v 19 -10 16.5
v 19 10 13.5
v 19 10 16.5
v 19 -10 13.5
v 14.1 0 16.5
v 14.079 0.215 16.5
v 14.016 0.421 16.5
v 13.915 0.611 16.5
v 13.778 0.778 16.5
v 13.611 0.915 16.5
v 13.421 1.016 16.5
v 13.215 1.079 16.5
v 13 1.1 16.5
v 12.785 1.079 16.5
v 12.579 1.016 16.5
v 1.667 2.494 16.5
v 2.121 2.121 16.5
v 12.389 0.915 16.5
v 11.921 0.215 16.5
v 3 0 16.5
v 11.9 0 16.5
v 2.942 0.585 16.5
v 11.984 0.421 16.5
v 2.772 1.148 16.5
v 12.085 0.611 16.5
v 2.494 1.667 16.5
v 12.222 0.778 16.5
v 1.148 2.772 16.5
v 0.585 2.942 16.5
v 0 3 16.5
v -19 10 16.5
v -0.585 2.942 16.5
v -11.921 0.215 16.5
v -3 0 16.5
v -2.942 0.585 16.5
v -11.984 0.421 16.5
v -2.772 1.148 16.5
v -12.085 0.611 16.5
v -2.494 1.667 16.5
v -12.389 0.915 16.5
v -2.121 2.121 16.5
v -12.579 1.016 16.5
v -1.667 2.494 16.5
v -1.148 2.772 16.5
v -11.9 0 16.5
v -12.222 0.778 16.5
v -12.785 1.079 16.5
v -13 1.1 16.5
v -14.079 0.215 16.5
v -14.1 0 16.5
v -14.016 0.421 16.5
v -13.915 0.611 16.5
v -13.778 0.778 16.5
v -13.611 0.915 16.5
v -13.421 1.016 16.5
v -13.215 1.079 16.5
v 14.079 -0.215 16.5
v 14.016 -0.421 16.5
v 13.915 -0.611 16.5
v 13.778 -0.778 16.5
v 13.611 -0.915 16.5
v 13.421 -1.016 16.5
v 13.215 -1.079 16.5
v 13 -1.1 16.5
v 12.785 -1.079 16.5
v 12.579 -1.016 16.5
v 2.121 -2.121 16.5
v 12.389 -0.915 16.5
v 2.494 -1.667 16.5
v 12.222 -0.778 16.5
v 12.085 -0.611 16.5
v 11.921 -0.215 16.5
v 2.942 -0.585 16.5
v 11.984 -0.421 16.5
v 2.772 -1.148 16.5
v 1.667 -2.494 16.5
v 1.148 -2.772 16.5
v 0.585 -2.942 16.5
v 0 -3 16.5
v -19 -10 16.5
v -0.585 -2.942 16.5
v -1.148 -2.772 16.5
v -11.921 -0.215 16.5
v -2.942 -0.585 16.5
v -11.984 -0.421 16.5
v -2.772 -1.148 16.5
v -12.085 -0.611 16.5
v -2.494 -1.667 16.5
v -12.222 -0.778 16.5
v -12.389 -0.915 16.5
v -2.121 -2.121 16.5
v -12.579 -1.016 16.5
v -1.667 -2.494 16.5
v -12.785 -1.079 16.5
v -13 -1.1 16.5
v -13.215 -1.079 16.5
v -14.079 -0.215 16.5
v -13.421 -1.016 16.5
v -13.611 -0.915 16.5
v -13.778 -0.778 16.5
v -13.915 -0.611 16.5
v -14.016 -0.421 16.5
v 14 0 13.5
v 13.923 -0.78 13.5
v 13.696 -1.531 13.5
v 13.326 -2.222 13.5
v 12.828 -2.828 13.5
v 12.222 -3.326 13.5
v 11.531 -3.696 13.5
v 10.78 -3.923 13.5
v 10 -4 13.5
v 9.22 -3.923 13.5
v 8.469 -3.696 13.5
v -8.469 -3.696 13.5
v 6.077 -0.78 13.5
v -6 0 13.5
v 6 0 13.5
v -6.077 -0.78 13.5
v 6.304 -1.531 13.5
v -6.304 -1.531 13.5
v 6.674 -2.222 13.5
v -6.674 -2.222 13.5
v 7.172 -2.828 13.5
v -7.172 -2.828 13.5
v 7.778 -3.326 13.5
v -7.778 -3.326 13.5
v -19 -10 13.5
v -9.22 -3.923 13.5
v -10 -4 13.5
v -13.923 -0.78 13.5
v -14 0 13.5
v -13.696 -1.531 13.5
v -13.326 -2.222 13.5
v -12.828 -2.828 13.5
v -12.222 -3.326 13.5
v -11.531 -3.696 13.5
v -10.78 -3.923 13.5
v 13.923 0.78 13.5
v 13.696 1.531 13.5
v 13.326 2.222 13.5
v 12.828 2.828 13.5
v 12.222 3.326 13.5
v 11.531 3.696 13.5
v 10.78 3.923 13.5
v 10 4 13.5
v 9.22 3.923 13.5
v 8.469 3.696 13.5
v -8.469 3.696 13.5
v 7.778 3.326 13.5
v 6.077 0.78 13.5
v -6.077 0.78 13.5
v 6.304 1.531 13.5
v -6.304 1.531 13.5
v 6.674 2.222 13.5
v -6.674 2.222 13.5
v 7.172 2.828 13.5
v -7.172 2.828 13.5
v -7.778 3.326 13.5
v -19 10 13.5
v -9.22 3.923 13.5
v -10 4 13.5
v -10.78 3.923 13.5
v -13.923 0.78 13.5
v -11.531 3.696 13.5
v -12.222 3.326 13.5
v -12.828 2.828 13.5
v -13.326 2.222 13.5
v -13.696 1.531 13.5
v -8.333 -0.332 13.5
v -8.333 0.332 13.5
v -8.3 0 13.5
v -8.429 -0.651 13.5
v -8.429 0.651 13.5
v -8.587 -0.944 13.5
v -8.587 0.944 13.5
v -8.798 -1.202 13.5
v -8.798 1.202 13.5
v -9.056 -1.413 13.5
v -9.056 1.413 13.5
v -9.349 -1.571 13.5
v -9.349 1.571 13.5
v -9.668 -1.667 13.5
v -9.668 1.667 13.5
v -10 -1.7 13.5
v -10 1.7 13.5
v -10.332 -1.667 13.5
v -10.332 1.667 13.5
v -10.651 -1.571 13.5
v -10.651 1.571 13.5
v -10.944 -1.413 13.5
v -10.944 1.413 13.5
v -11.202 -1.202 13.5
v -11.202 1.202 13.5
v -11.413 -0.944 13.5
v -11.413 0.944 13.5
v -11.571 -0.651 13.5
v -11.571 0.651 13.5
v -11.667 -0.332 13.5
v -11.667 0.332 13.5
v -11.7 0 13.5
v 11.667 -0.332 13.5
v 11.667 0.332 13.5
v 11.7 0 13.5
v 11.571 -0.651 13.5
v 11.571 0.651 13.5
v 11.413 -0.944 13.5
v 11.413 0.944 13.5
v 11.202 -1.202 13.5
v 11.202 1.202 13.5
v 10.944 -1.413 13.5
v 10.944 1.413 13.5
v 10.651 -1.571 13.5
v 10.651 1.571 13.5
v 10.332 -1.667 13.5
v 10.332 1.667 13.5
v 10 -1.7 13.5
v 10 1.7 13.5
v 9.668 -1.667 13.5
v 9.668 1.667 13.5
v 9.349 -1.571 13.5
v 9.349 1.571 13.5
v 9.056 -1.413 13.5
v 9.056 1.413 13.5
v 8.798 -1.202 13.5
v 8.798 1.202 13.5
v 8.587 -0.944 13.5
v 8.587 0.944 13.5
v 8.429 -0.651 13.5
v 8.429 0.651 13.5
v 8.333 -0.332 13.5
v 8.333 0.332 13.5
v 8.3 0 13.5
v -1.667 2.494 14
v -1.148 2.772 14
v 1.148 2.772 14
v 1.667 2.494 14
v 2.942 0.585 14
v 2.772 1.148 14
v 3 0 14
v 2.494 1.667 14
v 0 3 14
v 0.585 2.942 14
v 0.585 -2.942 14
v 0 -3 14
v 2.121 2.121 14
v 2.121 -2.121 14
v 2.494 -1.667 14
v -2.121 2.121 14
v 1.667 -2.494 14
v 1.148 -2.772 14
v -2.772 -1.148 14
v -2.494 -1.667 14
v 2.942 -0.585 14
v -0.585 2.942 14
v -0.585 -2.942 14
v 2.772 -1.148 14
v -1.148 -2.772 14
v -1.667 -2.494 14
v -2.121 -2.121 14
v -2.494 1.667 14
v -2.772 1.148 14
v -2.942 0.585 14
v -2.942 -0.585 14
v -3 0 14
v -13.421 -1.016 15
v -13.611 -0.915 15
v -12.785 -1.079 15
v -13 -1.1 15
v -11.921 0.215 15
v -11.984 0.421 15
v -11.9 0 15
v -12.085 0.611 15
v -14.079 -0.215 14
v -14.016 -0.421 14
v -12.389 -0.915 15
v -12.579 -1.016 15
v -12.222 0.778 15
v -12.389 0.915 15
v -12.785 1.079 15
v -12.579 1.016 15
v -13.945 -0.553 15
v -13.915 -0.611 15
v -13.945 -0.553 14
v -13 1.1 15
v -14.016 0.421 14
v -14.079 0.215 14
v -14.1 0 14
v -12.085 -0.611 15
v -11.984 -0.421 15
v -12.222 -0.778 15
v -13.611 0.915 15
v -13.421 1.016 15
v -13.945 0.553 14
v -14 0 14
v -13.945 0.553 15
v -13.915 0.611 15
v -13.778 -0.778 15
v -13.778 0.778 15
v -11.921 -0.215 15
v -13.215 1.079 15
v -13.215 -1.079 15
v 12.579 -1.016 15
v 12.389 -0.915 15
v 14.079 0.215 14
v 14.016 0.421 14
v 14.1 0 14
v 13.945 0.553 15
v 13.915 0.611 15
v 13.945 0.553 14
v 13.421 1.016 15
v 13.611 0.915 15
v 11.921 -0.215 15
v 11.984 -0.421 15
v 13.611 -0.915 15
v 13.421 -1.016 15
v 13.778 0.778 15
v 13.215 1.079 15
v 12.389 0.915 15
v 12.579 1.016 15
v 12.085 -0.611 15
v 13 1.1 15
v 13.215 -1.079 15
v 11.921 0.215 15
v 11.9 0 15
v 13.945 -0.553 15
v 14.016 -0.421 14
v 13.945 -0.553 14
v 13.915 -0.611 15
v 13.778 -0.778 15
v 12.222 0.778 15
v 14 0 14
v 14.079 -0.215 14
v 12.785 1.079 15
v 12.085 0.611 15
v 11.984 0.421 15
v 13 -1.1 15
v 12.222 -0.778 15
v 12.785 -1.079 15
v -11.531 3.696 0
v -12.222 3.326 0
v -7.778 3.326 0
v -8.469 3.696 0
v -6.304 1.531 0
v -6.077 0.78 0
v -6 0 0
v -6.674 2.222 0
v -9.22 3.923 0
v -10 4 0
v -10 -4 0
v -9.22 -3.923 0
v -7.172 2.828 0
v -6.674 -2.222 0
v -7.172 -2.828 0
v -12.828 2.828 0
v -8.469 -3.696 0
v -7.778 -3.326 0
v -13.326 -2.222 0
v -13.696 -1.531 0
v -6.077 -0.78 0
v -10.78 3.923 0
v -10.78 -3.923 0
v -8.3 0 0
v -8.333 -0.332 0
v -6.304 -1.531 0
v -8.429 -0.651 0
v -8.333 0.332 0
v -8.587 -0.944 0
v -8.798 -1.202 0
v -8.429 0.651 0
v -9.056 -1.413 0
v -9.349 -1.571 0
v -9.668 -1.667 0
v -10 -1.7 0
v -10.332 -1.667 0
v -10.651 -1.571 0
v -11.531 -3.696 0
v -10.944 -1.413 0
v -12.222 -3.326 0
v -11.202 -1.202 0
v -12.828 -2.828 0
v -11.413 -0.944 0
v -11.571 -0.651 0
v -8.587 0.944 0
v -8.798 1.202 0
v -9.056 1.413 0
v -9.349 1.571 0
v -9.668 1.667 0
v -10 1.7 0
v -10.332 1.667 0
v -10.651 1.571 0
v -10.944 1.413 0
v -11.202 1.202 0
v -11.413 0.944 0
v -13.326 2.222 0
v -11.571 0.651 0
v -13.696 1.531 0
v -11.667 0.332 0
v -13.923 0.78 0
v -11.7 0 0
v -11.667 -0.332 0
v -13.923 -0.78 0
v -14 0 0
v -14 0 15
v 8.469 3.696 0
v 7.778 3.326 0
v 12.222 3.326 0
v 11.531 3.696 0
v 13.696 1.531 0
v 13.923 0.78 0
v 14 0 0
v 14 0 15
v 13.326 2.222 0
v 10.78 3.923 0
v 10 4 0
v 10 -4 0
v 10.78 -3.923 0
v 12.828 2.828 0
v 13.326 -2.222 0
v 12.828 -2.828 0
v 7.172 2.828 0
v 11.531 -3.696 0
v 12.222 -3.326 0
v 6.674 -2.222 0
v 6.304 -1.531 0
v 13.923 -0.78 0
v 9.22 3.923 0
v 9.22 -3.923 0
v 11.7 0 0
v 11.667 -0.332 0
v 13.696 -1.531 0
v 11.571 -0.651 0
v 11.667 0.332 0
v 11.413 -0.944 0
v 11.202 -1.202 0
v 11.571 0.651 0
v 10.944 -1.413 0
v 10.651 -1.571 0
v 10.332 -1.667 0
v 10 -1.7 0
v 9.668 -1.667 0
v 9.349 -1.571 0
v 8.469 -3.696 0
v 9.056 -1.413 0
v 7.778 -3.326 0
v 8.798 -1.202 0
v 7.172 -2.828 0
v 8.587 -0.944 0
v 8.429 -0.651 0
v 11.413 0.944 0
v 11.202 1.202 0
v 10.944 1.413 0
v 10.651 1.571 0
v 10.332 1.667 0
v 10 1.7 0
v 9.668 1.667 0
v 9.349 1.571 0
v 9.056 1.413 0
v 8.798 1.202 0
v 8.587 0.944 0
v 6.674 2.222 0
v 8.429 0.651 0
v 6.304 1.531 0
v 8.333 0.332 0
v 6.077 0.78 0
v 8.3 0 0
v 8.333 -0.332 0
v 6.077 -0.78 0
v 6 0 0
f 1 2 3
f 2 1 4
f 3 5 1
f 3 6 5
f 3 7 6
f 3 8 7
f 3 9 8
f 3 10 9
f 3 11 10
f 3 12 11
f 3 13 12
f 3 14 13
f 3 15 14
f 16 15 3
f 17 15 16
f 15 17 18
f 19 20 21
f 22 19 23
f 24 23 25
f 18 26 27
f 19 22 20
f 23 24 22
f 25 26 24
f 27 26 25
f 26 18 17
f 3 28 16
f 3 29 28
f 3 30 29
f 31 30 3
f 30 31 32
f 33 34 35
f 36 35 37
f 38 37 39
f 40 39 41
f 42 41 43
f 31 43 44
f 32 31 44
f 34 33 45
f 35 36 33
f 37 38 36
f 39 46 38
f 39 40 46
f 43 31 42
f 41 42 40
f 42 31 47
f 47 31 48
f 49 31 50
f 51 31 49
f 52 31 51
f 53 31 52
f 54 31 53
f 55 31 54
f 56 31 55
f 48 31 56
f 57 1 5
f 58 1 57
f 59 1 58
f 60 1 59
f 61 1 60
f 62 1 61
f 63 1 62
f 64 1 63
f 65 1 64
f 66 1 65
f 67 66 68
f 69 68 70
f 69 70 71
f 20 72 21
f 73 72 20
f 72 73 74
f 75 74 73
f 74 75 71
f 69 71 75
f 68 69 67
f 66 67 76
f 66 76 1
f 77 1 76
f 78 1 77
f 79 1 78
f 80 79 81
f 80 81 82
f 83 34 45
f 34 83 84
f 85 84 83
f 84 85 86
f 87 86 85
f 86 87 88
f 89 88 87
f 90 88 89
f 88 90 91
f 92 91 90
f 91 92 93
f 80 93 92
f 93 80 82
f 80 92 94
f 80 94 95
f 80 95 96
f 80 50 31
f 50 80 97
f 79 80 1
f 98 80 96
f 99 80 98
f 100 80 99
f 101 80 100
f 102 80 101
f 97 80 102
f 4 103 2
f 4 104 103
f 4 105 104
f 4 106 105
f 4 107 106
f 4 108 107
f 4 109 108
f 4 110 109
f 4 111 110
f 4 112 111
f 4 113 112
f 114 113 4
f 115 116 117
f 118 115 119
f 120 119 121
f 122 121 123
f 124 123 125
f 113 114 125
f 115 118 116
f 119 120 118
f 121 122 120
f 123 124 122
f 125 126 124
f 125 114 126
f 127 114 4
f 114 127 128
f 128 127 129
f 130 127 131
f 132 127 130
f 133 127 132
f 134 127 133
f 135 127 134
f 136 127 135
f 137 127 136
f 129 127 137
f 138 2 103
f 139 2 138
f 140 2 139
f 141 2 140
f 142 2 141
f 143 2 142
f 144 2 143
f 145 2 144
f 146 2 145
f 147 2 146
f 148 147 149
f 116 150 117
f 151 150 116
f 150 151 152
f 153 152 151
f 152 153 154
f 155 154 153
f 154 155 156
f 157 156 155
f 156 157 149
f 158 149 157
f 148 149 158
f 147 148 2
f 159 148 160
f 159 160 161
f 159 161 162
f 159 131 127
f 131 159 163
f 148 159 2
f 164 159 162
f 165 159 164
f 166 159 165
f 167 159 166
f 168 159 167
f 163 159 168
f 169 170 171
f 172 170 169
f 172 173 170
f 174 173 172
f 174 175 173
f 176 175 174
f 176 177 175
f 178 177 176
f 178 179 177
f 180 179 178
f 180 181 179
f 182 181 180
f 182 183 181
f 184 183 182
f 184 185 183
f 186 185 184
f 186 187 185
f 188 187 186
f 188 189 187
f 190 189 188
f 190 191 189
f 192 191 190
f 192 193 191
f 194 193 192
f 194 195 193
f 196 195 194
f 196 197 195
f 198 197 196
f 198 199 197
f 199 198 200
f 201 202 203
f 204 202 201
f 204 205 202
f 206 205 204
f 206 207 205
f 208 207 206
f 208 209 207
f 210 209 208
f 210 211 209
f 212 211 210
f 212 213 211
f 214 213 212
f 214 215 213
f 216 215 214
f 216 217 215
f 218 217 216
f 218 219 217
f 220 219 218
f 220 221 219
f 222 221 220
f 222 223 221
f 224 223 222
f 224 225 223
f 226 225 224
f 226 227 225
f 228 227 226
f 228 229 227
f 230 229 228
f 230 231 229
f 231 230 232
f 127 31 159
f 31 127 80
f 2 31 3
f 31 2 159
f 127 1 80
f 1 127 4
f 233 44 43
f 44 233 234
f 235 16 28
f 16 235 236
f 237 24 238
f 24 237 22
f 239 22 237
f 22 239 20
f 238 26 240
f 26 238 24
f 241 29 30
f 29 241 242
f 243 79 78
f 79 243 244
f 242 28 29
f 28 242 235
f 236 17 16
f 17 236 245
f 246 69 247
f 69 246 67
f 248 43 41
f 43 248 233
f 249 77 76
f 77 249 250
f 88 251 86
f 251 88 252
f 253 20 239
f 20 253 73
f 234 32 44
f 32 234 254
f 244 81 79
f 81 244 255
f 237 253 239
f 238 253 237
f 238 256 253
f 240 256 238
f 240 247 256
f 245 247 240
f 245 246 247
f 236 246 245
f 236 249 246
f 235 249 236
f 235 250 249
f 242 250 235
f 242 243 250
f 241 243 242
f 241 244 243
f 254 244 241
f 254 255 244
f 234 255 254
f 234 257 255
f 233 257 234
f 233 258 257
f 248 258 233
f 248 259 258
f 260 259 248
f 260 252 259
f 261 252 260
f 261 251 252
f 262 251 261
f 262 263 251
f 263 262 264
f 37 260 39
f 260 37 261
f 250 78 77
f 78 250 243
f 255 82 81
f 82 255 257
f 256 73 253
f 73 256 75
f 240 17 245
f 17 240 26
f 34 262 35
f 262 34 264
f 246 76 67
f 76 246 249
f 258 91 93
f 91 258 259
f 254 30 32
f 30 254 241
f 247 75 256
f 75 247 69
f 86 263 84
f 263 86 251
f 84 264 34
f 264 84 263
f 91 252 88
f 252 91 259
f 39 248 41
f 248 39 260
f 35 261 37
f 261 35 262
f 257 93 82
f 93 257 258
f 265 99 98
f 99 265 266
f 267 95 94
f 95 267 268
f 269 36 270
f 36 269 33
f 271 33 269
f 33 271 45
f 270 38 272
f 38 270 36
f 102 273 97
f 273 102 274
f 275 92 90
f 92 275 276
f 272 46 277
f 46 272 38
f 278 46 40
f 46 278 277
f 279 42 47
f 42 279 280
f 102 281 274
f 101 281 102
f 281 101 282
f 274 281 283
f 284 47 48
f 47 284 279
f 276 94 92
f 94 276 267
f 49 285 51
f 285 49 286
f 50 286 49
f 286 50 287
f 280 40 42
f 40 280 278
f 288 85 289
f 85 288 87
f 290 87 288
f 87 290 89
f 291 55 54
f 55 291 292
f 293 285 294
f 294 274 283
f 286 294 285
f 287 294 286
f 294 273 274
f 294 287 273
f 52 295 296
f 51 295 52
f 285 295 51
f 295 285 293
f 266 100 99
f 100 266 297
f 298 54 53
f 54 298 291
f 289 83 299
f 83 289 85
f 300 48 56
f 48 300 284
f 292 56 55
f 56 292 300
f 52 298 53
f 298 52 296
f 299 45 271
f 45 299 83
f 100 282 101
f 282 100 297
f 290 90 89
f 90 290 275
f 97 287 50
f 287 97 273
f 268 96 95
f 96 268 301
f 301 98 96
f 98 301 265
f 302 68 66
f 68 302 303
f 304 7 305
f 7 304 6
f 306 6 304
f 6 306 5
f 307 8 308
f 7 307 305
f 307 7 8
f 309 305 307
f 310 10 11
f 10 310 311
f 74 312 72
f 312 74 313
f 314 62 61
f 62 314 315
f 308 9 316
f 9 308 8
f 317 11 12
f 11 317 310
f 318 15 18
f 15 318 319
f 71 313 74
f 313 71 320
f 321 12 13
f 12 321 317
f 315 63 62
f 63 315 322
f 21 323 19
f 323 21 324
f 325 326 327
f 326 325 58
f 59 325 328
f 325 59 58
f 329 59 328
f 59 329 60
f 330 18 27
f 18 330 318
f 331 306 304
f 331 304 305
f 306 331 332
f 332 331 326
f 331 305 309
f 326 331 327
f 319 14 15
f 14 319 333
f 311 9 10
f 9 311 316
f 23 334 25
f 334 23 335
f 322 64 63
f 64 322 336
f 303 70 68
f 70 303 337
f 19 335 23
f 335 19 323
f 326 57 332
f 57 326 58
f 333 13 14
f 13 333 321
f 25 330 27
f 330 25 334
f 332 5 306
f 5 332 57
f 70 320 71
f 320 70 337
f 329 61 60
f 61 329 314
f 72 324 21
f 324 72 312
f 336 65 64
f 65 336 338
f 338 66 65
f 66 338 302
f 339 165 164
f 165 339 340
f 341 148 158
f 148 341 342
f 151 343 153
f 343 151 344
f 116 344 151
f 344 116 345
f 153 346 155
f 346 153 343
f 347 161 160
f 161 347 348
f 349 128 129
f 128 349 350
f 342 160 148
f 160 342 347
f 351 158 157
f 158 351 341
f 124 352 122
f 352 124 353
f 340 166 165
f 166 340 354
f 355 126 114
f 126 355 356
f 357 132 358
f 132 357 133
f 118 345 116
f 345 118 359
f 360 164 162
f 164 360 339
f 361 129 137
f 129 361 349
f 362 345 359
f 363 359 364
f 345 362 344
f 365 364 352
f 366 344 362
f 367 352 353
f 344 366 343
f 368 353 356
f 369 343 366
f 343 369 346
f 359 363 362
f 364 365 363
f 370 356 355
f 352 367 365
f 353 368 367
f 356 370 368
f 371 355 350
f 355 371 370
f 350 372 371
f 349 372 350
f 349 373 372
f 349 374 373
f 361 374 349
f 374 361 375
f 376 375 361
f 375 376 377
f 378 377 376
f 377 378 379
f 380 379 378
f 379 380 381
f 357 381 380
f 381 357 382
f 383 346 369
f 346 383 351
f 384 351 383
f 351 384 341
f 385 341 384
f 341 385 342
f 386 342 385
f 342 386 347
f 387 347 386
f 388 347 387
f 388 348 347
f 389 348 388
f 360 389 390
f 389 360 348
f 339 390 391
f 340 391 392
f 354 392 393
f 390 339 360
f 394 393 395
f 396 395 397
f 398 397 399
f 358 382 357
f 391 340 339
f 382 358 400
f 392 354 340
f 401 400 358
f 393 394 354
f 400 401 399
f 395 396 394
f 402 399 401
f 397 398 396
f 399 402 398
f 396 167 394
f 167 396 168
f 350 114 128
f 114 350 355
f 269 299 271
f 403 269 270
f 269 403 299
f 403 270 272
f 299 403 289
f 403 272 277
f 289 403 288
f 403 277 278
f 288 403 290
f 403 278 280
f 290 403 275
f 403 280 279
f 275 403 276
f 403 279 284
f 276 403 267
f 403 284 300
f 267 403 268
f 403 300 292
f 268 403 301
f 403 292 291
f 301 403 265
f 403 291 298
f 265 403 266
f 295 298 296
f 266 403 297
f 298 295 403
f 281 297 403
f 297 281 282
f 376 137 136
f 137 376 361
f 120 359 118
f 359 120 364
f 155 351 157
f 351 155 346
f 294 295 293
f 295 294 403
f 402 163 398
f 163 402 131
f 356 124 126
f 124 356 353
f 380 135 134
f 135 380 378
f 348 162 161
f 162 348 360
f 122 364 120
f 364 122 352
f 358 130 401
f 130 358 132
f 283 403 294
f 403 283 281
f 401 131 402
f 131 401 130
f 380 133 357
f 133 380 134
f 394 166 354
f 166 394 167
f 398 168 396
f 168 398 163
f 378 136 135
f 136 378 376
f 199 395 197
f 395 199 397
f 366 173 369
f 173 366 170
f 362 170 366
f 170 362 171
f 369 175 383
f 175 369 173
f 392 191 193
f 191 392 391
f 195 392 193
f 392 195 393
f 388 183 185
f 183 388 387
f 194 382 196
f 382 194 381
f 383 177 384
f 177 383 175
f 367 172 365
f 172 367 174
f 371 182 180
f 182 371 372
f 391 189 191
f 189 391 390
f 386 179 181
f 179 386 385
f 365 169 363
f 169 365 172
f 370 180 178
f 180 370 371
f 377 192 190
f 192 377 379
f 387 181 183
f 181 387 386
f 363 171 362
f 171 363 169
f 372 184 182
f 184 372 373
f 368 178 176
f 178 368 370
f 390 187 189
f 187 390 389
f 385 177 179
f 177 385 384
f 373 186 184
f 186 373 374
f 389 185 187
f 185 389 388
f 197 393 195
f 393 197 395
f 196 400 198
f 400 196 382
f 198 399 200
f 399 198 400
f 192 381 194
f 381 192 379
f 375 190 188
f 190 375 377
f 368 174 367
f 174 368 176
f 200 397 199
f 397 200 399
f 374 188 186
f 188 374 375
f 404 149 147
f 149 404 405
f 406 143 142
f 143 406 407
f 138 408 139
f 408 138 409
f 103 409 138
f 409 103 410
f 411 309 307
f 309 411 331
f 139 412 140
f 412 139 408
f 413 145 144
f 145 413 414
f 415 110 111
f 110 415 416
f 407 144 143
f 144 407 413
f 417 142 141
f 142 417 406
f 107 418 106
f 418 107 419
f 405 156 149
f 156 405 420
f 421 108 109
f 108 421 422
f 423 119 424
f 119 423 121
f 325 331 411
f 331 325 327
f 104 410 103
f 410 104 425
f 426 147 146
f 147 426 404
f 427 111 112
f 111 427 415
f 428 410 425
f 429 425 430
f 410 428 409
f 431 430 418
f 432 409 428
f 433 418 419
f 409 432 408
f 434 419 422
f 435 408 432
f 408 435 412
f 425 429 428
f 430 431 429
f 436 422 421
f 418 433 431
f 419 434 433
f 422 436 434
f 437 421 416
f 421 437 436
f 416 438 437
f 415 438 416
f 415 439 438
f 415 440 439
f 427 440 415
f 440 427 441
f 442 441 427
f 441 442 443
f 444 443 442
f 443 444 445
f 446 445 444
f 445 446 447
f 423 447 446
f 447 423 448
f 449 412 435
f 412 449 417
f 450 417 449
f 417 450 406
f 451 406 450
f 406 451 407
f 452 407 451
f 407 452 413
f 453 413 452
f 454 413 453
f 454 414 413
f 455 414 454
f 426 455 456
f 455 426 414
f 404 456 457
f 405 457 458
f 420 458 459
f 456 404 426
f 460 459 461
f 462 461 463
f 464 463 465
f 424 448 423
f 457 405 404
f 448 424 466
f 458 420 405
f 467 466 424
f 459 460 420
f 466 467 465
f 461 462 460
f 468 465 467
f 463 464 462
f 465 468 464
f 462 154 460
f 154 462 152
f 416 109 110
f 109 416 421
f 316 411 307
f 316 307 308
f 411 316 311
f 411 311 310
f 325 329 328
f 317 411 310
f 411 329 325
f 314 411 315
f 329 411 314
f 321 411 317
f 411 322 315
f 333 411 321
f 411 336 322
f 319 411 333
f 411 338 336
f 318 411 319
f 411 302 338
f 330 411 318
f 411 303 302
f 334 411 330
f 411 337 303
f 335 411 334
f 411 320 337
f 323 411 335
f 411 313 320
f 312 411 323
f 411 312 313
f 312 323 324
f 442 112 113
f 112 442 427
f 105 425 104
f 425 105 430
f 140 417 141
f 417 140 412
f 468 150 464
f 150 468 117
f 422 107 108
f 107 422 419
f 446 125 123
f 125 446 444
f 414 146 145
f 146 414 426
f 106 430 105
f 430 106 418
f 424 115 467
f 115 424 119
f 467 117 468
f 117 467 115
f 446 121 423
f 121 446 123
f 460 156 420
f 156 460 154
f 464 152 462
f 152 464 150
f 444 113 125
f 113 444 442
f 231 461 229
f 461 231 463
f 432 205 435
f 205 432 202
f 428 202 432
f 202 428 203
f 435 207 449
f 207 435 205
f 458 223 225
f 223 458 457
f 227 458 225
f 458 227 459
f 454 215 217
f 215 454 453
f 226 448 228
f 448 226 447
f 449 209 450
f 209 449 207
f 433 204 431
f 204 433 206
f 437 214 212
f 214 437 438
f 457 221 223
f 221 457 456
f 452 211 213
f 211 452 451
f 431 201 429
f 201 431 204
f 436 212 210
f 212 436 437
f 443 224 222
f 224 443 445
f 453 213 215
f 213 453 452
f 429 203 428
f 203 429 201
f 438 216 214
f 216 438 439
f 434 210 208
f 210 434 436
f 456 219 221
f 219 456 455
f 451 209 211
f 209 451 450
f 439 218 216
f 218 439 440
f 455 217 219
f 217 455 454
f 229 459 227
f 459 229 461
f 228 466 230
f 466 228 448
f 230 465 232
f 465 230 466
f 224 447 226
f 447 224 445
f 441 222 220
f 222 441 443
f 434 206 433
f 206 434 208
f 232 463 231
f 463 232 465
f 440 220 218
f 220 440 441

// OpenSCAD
// suport_seguidor_linia.scad
// Suport del seguidor de linia KS0050 per al rover (T3), enganxat/cargolat
// sota el xassis del vehicle ja muntat, amb el sensor mirant a terra
// (Sessio 0, vegeu Classes/00_General/00_Projecte_T3_Rover.md). Peca nova,
// petita: NO hi ha plantilla laser (vegeu
// Recursos/plantilles_laser/README.md).
// Material recomanat: PLA. 1 unitat per rover.

// --- Parametres (mm) ---
// Modul KS0050 (seguidor de linia IR, 1 canal): placa aprox. 32 x 14 mm.
amplada_sensor = 32;
fondaria_sensor = 14;
gruix_placa = 3;
marge = 3;
alcada_potes = 15;             // distancia del sensor al terra (mirant avall)
diametre_ull = 6;              // finestra pel LED/fotodiode emissor+receptor
separacio_forats_sensor = 26;  // distancia entre forats de muntatge del modul
forat_m3 = 3.4;                // forats per fixar el suport al xassis
separacio_forats_xassis = 20;
$fn = 32;

module placa_sensor() {
    difference() {
        cube([amplada_sensor + marge * 2, fondaria_sensor + marge * 2, gruix_placa],
             center = true);
        // finestra de visio del sensor cap a terra
        translate([0, 0, -1])
            cylinder(h = gruix_placa + 2, d = diametre_ull);
        // forats de muntatge del modul KS0050
        translate([-separacio_forats_sensor / 2, 0, -1])
            cylinder(h = gruix_placa + 2, d = 2.2);
        translate([separacio_forats_sensor / 2, 0, -1])
            cylinder(h = gruix_placa + 2, d = 2.2);
    }
}

module pota(x) {
    translate([x, 0, 0])
        difference() {
            cylinder(h = alcada_potes, d = 8);
            translate([0, 0, -1])
                cylinder(h = alcada_potes + 2, d = forat_m3);
        }
}

union() {
    translate([0, 0, alcada_potes])
        placa_sensor();
    pota(-separacio_forats_xassis / 2);
    pota(separacio_forats_xassis / 2);
}
